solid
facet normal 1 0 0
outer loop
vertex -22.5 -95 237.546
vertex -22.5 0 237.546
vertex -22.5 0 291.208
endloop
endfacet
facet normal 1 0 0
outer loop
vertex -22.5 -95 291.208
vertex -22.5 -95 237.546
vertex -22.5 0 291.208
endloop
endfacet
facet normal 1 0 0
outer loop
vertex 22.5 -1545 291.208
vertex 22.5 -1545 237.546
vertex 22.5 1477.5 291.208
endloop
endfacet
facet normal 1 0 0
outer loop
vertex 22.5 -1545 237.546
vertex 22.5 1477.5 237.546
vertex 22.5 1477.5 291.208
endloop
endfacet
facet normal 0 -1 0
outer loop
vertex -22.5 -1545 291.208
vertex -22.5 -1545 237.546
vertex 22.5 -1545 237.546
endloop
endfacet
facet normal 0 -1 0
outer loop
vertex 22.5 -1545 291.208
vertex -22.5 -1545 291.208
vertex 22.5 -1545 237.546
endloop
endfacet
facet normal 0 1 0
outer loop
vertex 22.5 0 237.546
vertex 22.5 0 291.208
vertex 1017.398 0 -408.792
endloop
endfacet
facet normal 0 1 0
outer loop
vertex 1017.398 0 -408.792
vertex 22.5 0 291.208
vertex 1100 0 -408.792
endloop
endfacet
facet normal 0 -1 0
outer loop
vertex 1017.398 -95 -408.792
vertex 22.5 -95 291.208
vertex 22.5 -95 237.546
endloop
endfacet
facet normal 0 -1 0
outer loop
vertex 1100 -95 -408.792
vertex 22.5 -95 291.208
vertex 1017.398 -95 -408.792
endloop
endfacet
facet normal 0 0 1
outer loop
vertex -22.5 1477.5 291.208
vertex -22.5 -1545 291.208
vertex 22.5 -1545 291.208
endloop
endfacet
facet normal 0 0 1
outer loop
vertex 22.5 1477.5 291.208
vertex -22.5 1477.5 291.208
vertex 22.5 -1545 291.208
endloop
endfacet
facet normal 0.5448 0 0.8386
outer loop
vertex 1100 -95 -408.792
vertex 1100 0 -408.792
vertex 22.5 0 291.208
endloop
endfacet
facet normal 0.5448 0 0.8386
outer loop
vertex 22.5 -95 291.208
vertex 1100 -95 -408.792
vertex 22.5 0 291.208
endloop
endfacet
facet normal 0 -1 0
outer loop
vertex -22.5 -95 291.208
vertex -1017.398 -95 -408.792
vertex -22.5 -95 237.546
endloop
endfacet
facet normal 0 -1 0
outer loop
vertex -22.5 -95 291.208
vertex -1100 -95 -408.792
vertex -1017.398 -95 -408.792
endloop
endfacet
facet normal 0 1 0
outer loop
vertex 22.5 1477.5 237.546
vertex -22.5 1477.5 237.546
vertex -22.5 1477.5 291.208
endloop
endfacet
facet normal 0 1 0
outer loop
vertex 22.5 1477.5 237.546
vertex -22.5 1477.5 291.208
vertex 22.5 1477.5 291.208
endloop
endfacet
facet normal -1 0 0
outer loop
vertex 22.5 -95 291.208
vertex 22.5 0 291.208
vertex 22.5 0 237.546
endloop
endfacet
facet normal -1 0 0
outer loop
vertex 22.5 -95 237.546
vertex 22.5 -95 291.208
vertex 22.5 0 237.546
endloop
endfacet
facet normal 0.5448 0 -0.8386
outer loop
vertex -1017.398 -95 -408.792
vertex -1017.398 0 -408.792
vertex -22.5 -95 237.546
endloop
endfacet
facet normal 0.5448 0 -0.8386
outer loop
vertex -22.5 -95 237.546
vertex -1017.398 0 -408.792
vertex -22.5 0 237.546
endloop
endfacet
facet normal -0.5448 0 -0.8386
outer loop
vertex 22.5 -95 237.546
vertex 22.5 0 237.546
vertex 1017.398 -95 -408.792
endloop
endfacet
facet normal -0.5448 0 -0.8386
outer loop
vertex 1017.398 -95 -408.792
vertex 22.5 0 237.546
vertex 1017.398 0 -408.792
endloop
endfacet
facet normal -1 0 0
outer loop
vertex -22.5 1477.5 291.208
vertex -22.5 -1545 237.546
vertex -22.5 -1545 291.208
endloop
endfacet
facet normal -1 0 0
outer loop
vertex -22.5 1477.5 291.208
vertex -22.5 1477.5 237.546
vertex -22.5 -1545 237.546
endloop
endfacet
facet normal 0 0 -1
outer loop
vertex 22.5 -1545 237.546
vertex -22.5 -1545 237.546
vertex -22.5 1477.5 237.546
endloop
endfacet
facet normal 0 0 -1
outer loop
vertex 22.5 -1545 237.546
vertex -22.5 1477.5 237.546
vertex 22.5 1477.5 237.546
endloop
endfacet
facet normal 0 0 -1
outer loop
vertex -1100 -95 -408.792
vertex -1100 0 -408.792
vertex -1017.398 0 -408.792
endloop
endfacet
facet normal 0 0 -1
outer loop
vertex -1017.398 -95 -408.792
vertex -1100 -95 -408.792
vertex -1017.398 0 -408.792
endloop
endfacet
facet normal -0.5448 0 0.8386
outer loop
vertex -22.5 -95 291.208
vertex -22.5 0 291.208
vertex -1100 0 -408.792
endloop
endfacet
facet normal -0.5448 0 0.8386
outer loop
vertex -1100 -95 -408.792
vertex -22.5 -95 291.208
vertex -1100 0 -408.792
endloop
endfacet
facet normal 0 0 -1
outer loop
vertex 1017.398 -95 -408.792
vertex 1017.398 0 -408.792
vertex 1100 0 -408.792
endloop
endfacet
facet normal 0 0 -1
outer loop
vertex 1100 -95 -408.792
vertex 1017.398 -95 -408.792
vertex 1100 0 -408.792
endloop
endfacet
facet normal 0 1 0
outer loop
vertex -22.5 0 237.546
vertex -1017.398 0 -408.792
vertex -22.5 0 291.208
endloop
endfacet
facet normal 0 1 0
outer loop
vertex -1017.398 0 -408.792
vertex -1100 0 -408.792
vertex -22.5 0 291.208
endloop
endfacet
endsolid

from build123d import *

# Parameters (mm, degrees)
F1_DEPTH = 95
F0_W     = 45
F0_H     = 53.6623383946
F2_DEPTH = 1477.5
F3_DEPTH = 1545


with BuildPart() as f1:
    # F0 (on Front) → F1 (new body)
    with BuildSketch(Plane.XZ):
        Polygon((-22.5, 237.5461500682), (-22.5, 291.2084884628), (-1100, -408.7915115372), (-1017.398329114, -408.7915115372), align=None)
    extrude(amount=F1_DEPTH)


with BuildPart() as f1b:
    # F0 (on Front) → F1, piece 2 (new body)
    with BuildSketch(Plane.XZ):
        Polygon((1100, -408.7915115372), (22.5, 291.2084884628), (22.5, 237.5461500682), (1017.398329114, -408.7915115372), align=None)
    extrude(amount=F1_DEPTH)


with BuildPart() as f2:
    # F0 (on Front) → F2 (new body)
    with BuildSketch(Plane.XZ):
        with Locations((0, 264.3773192655)):
            Rectangle(F0_W, F0_H)
    extrude(amount=-F2_DEPTH)

    # F0 (on Front) → F3 (join)
    with BuildSketch(Plane.XZ):
        with Locations((0, 264.3773192655)):
            Rectangle(F0_W, F0_H)
    extrude(amount=F3_DEPTH)


solid = Compound([f1.part, f1b.part, f2.part])
